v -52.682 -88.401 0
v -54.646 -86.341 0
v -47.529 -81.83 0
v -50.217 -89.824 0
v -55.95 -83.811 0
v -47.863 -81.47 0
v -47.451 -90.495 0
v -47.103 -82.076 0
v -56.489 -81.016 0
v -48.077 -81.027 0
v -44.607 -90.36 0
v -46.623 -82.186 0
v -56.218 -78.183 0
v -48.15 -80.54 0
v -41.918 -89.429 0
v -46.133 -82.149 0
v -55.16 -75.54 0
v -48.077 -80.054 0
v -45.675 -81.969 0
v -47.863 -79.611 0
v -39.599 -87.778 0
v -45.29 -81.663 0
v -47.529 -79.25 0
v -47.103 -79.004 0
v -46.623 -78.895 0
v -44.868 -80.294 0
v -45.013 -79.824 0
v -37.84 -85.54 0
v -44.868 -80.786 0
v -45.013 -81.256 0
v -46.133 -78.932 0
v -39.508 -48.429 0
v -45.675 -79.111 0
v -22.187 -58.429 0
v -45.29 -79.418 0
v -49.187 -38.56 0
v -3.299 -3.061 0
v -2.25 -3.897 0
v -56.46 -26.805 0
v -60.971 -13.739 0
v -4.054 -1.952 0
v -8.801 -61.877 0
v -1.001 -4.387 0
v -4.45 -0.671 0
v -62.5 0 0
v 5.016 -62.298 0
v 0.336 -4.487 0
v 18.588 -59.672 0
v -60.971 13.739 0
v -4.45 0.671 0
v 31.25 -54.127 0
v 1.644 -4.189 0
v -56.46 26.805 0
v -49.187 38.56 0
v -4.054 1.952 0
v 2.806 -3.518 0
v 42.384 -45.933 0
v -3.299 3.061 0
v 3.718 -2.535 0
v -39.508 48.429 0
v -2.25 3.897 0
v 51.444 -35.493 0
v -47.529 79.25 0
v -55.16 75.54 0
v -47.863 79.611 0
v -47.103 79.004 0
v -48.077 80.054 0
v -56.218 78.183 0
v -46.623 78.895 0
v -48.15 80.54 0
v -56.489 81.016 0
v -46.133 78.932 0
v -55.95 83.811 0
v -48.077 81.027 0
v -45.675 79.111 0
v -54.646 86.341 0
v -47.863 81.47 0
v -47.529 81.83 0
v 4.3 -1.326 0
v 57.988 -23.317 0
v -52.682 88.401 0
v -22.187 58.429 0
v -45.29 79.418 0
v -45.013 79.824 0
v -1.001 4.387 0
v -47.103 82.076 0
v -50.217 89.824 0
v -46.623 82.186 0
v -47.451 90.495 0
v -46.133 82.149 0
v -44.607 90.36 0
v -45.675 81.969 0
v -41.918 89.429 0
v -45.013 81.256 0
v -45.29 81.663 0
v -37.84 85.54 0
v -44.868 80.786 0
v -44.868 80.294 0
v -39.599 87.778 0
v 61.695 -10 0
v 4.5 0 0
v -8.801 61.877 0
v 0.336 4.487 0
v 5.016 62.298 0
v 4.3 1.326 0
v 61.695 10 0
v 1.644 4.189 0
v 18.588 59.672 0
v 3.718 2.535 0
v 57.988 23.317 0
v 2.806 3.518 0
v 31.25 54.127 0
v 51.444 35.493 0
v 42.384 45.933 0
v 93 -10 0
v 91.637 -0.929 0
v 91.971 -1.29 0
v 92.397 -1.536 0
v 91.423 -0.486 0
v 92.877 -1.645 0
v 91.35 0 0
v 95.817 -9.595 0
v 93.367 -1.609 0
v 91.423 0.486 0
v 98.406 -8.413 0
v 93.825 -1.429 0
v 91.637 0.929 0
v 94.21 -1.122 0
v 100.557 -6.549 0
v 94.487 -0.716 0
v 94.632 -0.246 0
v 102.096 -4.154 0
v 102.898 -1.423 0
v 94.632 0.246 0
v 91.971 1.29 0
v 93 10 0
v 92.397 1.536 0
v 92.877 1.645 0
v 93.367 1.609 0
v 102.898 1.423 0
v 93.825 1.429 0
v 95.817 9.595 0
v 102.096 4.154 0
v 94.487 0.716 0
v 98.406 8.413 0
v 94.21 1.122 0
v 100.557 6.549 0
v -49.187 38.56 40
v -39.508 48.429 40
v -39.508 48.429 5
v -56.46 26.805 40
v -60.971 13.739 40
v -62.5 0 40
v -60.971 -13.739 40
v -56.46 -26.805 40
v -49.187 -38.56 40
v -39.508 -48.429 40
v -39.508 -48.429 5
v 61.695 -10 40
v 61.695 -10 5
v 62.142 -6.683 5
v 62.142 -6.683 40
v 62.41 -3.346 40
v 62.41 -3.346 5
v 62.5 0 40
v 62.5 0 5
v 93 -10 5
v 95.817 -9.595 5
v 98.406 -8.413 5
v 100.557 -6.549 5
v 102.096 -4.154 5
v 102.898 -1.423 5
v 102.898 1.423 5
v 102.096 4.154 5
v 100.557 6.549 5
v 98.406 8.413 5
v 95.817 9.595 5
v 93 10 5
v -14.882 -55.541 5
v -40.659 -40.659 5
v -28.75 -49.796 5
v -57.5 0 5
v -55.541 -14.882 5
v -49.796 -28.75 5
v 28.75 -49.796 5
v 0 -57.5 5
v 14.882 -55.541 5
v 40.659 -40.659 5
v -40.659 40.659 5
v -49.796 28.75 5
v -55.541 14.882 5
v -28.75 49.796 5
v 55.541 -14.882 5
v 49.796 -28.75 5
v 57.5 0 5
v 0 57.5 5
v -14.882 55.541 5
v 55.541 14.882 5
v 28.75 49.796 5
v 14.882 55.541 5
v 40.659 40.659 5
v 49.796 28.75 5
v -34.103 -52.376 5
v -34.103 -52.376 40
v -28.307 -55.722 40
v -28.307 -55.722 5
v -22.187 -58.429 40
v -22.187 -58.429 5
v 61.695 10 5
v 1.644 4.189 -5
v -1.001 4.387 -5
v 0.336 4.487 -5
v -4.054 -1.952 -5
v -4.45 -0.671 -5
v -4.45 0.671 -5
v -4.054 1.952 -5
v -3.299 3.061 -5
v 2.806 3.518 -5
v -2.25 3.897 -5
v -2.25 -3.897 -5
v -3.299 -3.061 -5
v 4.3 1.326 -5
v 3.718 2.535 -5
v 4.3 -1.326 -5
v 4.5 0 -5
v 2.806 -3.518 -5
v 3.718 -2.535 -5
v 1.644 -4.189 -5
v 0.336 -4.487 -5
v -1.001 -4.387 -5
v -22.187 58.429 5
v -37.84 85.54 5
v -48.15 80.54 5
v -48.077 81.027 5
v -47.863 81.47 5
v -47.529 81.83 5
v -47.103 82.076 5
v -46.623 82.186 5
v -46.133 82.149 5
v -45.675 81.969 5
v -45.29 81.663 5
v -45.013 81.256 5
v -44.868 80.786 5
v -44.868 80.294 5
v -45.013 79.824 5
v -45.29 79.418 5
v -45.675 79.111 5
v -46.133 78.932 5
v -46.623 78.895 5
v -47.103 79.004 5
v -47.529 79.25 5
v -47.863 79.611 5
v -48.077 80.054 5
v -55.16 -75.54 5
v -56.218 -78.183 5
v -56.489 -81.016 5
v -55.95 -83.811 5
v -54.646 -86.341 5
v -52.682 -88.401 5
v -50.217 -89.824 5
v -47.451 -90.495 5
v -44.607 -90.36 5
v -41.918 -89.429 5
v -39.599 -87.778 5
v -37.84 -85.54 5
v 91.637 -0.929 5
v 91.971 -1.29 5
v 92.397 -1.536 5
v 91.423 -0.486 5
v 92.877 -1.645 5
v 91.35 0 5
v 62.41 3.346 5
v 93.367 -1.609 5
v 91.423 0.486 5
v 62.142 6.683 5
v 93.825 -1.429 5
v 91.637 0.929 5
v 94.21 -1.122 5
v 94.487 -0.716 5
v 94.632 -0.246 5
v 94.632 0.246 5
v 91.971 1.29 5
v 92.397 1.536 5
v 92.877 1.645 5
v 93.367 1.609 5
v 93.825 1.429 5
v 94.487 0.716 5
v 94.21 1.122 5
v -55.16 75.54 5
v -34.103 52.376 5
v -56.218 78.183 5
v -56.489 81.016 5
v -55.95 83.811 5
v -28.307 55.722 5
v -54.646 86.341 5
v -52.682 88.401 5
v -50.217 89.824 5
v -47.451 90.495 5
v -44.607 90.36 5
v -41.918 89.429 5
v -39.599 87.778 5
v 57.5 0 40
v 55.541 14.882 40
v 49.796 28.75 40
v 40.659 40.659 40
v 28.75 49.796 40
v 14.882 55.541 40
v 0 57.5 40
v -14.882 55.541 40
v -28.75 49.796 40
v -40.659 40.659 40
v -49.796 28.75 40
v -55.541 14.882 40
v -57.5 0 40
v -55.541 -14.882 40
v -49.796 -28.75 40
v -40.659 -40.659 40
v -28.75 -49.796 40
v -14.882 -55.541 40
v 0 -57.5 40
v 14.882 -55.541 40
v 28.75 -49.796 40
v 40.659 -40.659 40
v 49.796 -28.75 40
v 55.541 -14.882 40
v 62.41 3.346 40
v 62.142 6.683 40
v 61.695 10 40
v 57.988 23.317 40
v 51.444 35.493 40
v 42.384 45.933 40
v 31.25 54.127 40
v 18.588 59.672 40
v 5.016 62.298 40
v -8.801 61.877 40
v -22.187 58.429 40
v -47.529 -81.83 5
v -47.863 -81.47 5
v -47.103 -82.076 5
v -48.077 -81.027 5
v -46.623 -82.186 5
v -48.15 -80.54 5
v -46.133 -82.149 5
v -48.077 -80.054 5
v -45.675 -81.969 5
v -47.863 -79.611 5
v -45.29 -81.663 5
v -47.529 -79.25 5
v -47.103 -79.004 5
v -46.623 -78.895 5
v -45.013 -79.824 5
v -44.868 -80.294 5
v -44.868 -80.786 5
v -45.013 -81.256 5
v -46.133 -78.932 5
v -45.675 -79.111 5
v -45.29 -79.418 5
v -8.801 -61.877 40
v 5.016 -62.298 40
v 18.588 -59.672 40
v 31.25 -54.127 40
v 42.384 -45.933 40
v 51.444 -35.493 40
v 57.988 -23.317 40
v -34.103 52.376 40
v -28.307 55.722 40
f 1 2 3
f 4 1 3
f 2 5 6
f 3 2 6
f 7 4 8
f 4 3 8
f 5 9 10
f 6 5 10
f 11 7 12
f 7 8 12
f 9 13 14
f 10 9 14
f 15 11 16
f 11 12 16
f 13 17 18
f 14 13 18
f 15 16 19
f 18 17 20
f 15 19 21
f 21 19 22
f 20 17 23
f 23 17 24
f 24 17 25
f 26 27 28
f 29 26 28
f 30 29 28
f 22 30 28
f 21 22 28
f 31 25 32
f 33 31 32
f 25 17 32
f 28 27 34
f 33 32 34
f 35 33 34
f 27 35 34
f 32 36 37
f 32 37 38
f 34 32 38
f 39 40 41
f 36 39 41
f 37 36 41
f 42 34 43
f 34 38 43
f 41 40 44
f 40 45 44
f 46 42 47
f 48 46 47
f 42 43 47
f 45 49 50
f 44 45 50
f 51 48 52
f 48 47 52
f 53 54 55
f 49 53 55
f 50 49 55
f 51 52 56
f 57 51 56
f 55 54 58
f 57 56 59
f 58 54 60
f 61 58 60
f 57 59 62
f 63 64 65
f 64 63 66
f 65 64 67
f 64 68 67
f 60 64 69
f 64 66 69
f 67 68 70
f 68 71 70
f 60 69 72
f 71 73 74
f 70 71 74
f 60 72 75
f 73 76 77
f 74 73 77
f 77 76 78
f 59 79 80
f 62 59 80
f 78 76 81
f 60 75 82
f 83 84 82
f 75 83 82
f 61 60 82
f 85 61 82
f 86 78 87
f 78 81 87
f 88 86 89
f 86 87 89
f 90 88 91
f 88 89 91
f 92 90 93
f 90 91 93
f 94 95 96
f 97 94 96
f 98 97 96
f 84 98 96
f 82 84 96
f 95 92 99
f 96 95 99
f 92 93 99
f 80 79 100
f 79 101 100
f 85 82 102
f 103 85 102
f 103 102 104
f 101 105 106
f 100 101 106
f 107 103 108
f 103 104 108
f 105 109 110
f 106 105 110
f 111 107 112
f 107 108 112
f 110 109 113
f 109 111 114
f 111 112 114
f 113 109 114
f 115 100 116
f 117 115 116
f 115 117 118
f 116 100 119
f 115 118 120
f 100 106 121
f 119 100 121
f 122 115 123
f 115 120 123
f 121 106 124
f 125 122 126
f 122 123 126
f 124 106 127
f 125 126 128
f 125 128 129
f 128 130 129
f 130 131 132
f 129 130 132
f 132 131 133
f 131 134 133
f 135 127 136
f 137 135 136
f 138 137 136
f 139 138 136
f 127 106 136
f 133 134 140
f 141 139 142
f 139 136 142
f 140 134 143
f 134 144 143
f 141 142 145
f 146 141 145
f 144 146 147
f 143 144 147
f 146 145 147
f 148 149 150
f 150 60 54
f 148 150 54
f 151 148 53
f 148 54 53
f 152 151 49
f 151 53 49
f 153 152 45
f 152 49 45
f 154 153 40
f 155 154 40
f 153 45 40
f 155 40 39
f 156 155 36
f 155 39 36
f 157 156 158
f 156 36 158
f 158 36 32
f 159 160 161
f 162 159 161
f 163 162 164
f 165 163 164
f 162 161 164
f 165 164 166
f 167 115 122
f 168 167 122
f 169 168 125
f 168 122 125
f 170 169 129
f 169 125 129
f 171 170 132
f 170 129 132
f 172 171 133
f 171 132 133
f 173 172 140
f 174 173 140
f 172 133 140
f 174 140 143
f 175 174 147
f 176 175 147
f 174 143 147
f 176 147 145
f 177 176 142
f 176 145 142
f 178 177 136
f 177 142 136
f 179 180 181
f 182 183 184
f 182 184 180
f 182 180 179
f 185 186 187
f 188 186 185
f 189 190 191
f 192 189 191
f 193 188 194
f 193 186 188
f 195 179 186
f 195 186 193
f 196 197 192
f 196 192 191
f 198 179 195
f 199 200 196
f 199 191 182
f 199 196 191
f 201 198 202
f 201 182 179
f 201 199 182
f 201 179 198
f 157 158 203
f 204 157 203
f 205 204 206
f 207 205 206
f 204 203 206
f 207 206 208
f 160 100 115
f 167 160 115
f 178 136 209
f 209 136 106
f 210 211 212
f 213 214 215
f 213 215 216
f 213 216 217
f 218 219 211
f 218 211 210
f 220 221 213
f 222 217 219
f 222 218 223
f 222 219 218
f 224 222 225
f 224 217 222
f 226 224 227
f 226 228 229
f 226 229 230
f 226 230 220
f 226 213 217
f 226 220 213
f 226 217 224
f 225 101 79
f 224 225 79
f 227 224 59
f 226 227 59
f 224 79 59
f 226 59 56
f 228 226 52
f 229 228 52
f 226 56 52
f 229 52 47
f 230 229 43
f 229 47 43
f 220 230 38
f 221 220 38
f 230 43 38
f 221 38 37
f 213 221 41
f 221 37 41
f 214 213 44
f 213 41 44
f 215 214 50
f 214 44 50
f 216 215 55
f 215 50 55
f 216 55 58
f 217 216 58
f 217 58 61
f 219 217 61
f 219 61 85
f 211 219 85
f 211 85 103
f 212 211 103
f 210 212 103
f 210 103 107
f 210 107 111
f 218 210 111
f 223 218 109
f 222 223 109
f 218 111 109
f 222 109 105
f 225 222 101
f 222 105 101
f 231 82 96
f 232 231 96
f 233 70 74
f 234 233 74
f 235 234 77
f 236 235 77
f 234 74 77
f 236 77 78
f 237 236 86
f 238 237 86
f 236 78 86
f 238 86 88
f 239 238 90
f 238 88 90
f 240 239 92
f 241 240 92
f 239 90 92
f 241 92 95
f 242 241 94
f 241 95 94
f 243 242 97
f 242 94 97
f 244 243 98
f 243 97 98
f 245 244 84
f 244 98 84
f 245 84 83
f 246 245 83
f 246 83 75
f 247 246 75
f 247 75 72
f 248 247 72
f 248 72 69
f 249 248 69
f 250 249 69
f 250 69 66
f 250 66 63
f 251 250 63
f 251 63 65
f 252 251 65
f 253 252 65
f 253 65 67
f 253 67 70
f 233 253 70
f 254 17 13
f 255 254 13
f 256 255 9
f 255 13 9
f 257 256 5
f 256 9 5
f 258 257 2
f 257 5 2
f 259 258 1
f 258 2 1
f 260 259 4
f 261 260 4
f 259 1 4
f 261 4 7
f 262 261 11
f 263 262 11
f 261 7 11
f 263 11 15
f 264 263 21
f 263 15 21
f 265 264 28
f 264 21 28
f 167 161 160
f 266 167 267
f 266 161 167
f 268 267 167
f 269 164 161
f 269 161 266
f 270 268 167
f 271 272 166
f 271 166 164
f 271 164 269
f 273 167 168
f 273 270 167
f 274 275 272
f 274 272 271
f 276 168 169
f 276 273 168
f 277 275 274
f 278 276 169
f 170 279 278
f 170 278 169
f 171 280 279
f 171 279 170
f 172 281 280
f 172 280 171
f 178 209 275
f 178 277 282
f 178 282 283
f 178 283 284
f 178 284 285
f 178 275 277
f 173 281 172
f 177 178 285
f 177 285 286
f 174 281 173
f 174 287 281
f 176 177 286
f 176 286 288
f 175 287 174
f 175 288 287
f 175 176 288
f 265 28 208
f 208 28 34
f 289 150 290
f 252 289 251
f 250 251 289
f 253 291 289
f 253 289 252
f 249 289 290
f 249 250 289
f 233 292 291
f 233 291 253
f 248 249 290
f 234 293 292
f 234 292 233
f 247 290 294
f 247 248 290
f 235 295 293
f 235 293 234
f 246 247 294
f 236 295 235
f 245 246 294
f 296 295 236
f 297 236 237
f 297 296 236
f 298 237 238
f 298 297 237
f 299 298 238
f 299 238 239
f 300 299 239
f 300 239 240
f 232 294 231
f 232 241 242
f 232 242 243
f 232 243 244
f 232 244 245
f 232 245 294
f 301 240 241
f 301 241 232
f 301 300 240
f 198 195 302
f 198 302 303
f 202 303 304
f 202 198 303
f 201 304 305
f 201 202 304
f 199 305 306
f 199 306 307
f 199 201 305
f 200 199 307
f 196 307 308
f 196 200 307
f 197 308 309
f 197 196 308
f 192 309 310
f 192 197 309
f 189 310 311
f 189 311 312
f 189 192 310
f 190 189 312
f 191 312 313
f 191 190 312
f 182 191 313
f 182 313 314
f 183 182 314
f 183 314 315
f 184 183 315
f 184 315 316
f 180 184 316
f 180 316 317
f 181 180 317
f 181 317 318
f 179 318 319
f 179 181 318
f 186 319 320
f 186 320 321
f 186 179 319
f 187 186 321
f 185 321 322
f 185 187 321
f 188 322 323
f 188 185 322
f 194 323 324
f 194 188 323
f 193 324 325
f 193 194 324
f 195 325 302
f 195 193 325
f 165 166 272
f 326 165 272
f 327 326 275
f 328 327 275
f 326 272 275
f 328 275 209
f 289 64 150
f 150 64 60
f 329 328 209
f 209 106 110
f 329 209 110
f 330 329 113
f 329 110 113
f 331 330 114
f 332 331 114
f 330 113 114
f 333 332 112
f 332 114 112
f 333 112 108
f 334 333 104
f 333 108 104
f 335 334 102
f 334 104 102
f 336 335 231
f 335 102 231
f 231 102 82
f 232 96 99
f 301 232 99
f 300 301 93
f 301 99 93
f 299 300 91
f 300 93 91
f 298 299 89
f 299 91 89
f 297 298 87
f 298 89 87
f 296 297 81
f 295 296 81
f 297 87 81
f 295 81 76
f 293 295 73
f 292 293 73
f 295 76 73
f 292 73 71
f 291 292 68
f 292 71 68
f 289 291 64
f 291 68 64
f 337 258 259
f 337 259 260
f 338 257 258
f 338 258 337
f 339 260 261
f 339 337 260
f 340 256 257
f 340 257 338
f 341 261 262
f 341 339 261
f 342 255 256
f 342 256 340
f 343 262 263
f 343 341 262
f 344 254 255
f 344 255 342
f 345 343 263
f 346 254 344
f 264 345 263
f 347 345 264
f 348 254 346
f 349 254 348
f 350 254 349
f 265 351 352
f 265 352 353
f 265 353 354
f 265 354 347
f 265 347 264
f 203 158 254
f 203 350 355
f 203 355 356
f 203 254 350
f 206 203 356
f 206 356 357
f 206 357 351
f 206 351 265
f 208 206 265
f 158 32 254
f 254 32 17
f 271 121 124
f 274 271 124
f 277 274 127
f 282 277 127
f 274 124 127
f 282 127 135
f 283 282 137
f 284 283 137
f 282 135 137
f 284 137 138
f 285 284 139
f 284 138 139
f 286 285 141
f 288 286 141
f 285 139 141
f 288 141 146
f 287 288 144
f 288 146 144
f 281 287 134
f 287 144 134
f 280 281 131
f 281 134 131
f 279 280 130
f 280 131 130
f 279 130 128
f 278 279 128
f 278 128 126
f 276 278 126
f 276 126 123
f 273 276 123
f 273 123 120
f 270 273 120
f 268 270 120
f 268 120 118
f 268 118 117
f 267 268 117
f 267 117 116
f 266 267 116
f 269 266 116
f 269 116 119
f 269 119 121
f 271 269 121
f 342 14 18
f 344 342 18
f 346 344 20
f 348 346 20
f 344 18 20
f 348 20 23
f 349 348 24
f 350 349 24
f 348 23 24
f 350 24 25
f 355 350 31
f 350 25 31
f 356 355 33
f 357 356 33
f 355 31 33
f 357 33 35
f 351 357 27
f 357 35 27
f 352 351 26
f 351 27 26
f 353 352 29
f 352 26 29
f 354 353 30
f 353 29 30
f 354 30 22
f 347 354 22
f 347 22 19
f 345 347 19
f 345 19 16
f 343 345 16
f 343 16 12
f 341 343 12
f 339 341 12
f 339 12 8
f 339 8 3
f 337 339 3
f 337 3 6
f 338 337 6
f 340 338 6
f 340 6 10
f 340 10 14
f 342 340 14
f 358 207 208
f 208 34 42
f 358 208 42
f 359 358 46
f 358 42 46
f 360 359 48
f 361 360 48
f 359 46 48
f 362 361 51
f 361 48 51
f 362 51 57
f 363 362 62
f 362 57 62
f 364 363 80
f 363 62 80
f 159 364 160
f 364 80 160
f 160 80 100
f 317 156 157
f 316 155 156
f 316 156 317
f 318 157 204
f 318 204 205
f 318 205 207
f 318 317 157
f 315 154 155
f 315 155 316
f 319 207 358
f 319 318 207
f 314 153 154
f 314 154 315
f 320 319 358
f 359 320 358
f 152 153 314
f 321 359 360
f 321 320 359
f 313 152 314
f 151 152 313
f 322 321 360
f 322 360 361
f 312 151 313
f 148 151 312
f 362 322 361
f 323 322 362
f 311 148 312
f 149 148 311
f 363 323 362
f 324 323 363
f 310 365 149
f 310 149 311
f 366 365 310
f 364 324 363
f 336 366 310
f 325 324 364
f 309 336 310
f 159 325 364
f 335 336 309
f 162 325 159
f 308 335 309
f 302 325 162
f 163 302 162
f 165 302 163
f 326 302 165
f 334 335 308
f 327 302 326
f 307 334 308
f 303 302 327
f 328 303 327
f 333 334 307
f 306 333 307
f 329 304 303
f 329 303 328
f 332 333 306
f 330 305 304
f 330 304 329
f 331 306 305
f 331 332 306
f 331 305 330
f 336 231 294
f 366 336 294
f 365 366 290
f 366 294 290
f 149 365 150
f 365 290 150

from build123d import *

# Parameters (mm, degrees)
F3_DEPTH = 5
F5_D     = 3.3
F6_R     = 4.5
F7_DEPTH = 5
F8_R     = 57.5
F9_DEPTH = 35


with BuildPart() as f3:
    # F2 (on Top) → F3 (new body)
    with BuildSketch(Plane.XY):
        with BuildLine():
            ThreePointArc((-39.507660736, 48.4292756829), (-31.25, 54.1265877365), (-22.1871526603, 58.4292756829))
            Line((-22.1871526603, 58.4292756829), (-37.8397459622, 85.540362552))
            ThreePointArc((-37.8397459622, 85.540362552), (-51.5, 89.2006165898), (-55.1602540378, 75.540362552))
            Line((-55.1602540378, 75.540362552), (-39.507660736, 48.4292756829))
        make_face()
        with BuildLine():
            ThreePointArc((61.6948133963, -10), (62.2983781381, -5.0161819511), (62.5, 0))
            ThreePointArc((62.5, 0), (62.2983781381, 5.0161819511), (61.6948133963, 10))
            ThreePointArc((61.6948133963, 10), (31.25, 54.1265877365), (-22.1871526603, 58.4292756829))
            ThreePointArc((-22.1871526603, 58.4292756829), (-31.25, 54.1265877365), (-39.507660736, 48.4292756829))
            ThreePointArc((-39.507660736, 48.4292756829), (-62.5, 0), (-39.507660736, -48.4292756829))
            ThreePointArc((-39.507660736, -48.4292756829), (-31.25, -54.1265877365), (-22.1871526603, -58.4292756829))
            ThreePointArc((-22.1871526603, -58.4292756829), (31.25, -54.1265877365), (61.6948133963, -10))
        make_face()
        with BuildLine():
            ThreePointArc((61.6948133963, 10), (62.2983781381, 5.0161819511), (62.5, 0))
            ThreePointArc((62.5, 0), (62.2983781381, -5.0161819511), (61.6948133963, -10))
            Line((61.6948133963, -10), (93, -10))
            ThreePointArc((93, -10), (103, 0), (93, 10))
            Line((93, 10), (61.6948133963, 10))
        make_face()
        with BuildLine():
            Line((-37.8397459622, -85.540362552), (-22.1871526603, -58.4292756829))
            ThreePointArc((-22.1871526603, -58.4292756829), (-31.25, -54.1265877365), (-39.507660736, -48.4292756829))
            Line((-39.507660736, -48.4292756829), (-55.1602540378, -75.540362552))
            ThreePointArc((-55.1602540378, -75.540362552), (-51.5, -89.2006165898), (-37.8397459622, -85.540362552))
        make_face()
    extrude(amount=F3_DEPTH)

    # F5 (through all)
    with Locations(Plane.XY.offset(5)):
        with Locations((-46.5, 80.540362552), (93, 0), (-46.5, -80.540362552)):
            Hole(F5_D / 2)

    # F6 (on face) → F7 (join)
    with BuildSketch(Plane(origin=(0, 0, 0), x_dir=(1, 0, 0), z_dir=(0, 0, -1))):
        Circle(F6_R)
    extrude(amount=F7_DEPTH)

    # F8 (on face) → F9 (join)
    with BuildSketch(Plane.XY.offset(5)):
        with BuildLine():
            ThreePointArc((61.6948133963, -10), (62.2983781381, -5.0161819511), (62.5, 0))
            ThreePointArc((62.5, 0), (62.2983781381, 5.0161819511), (61.6948133963, 10))
            ThreePointArc((61.6948133963, 10), (31.25, 54.1265877365), (-22.1871526603, 58.4292756829))
            ThreePointArc((-22.1871526603, 58.4292756829), (-31.25, 54.1265877365), (-39.507660736, 48.4292756829))
            ThreePointArc((-39.507660736, 48.4292756829), (-62.5, 0), (-39.507660736, -48.4292756829))
            ThreePointArc((-39.507660736, -48.4292756829), (-31.25, -54.1265877365), (-22.1871526603, -58.4292756829))
            ThreePointArc((-22.1871526603, -58.4292756829), (31.25, -54.1265877365), (61.6948133963, -10))
        make_face()
        Circle(F8_R, mode=Mode.SUBTRACT)
    extrude(amount=F9_DEPTH)


solid = f3.part
